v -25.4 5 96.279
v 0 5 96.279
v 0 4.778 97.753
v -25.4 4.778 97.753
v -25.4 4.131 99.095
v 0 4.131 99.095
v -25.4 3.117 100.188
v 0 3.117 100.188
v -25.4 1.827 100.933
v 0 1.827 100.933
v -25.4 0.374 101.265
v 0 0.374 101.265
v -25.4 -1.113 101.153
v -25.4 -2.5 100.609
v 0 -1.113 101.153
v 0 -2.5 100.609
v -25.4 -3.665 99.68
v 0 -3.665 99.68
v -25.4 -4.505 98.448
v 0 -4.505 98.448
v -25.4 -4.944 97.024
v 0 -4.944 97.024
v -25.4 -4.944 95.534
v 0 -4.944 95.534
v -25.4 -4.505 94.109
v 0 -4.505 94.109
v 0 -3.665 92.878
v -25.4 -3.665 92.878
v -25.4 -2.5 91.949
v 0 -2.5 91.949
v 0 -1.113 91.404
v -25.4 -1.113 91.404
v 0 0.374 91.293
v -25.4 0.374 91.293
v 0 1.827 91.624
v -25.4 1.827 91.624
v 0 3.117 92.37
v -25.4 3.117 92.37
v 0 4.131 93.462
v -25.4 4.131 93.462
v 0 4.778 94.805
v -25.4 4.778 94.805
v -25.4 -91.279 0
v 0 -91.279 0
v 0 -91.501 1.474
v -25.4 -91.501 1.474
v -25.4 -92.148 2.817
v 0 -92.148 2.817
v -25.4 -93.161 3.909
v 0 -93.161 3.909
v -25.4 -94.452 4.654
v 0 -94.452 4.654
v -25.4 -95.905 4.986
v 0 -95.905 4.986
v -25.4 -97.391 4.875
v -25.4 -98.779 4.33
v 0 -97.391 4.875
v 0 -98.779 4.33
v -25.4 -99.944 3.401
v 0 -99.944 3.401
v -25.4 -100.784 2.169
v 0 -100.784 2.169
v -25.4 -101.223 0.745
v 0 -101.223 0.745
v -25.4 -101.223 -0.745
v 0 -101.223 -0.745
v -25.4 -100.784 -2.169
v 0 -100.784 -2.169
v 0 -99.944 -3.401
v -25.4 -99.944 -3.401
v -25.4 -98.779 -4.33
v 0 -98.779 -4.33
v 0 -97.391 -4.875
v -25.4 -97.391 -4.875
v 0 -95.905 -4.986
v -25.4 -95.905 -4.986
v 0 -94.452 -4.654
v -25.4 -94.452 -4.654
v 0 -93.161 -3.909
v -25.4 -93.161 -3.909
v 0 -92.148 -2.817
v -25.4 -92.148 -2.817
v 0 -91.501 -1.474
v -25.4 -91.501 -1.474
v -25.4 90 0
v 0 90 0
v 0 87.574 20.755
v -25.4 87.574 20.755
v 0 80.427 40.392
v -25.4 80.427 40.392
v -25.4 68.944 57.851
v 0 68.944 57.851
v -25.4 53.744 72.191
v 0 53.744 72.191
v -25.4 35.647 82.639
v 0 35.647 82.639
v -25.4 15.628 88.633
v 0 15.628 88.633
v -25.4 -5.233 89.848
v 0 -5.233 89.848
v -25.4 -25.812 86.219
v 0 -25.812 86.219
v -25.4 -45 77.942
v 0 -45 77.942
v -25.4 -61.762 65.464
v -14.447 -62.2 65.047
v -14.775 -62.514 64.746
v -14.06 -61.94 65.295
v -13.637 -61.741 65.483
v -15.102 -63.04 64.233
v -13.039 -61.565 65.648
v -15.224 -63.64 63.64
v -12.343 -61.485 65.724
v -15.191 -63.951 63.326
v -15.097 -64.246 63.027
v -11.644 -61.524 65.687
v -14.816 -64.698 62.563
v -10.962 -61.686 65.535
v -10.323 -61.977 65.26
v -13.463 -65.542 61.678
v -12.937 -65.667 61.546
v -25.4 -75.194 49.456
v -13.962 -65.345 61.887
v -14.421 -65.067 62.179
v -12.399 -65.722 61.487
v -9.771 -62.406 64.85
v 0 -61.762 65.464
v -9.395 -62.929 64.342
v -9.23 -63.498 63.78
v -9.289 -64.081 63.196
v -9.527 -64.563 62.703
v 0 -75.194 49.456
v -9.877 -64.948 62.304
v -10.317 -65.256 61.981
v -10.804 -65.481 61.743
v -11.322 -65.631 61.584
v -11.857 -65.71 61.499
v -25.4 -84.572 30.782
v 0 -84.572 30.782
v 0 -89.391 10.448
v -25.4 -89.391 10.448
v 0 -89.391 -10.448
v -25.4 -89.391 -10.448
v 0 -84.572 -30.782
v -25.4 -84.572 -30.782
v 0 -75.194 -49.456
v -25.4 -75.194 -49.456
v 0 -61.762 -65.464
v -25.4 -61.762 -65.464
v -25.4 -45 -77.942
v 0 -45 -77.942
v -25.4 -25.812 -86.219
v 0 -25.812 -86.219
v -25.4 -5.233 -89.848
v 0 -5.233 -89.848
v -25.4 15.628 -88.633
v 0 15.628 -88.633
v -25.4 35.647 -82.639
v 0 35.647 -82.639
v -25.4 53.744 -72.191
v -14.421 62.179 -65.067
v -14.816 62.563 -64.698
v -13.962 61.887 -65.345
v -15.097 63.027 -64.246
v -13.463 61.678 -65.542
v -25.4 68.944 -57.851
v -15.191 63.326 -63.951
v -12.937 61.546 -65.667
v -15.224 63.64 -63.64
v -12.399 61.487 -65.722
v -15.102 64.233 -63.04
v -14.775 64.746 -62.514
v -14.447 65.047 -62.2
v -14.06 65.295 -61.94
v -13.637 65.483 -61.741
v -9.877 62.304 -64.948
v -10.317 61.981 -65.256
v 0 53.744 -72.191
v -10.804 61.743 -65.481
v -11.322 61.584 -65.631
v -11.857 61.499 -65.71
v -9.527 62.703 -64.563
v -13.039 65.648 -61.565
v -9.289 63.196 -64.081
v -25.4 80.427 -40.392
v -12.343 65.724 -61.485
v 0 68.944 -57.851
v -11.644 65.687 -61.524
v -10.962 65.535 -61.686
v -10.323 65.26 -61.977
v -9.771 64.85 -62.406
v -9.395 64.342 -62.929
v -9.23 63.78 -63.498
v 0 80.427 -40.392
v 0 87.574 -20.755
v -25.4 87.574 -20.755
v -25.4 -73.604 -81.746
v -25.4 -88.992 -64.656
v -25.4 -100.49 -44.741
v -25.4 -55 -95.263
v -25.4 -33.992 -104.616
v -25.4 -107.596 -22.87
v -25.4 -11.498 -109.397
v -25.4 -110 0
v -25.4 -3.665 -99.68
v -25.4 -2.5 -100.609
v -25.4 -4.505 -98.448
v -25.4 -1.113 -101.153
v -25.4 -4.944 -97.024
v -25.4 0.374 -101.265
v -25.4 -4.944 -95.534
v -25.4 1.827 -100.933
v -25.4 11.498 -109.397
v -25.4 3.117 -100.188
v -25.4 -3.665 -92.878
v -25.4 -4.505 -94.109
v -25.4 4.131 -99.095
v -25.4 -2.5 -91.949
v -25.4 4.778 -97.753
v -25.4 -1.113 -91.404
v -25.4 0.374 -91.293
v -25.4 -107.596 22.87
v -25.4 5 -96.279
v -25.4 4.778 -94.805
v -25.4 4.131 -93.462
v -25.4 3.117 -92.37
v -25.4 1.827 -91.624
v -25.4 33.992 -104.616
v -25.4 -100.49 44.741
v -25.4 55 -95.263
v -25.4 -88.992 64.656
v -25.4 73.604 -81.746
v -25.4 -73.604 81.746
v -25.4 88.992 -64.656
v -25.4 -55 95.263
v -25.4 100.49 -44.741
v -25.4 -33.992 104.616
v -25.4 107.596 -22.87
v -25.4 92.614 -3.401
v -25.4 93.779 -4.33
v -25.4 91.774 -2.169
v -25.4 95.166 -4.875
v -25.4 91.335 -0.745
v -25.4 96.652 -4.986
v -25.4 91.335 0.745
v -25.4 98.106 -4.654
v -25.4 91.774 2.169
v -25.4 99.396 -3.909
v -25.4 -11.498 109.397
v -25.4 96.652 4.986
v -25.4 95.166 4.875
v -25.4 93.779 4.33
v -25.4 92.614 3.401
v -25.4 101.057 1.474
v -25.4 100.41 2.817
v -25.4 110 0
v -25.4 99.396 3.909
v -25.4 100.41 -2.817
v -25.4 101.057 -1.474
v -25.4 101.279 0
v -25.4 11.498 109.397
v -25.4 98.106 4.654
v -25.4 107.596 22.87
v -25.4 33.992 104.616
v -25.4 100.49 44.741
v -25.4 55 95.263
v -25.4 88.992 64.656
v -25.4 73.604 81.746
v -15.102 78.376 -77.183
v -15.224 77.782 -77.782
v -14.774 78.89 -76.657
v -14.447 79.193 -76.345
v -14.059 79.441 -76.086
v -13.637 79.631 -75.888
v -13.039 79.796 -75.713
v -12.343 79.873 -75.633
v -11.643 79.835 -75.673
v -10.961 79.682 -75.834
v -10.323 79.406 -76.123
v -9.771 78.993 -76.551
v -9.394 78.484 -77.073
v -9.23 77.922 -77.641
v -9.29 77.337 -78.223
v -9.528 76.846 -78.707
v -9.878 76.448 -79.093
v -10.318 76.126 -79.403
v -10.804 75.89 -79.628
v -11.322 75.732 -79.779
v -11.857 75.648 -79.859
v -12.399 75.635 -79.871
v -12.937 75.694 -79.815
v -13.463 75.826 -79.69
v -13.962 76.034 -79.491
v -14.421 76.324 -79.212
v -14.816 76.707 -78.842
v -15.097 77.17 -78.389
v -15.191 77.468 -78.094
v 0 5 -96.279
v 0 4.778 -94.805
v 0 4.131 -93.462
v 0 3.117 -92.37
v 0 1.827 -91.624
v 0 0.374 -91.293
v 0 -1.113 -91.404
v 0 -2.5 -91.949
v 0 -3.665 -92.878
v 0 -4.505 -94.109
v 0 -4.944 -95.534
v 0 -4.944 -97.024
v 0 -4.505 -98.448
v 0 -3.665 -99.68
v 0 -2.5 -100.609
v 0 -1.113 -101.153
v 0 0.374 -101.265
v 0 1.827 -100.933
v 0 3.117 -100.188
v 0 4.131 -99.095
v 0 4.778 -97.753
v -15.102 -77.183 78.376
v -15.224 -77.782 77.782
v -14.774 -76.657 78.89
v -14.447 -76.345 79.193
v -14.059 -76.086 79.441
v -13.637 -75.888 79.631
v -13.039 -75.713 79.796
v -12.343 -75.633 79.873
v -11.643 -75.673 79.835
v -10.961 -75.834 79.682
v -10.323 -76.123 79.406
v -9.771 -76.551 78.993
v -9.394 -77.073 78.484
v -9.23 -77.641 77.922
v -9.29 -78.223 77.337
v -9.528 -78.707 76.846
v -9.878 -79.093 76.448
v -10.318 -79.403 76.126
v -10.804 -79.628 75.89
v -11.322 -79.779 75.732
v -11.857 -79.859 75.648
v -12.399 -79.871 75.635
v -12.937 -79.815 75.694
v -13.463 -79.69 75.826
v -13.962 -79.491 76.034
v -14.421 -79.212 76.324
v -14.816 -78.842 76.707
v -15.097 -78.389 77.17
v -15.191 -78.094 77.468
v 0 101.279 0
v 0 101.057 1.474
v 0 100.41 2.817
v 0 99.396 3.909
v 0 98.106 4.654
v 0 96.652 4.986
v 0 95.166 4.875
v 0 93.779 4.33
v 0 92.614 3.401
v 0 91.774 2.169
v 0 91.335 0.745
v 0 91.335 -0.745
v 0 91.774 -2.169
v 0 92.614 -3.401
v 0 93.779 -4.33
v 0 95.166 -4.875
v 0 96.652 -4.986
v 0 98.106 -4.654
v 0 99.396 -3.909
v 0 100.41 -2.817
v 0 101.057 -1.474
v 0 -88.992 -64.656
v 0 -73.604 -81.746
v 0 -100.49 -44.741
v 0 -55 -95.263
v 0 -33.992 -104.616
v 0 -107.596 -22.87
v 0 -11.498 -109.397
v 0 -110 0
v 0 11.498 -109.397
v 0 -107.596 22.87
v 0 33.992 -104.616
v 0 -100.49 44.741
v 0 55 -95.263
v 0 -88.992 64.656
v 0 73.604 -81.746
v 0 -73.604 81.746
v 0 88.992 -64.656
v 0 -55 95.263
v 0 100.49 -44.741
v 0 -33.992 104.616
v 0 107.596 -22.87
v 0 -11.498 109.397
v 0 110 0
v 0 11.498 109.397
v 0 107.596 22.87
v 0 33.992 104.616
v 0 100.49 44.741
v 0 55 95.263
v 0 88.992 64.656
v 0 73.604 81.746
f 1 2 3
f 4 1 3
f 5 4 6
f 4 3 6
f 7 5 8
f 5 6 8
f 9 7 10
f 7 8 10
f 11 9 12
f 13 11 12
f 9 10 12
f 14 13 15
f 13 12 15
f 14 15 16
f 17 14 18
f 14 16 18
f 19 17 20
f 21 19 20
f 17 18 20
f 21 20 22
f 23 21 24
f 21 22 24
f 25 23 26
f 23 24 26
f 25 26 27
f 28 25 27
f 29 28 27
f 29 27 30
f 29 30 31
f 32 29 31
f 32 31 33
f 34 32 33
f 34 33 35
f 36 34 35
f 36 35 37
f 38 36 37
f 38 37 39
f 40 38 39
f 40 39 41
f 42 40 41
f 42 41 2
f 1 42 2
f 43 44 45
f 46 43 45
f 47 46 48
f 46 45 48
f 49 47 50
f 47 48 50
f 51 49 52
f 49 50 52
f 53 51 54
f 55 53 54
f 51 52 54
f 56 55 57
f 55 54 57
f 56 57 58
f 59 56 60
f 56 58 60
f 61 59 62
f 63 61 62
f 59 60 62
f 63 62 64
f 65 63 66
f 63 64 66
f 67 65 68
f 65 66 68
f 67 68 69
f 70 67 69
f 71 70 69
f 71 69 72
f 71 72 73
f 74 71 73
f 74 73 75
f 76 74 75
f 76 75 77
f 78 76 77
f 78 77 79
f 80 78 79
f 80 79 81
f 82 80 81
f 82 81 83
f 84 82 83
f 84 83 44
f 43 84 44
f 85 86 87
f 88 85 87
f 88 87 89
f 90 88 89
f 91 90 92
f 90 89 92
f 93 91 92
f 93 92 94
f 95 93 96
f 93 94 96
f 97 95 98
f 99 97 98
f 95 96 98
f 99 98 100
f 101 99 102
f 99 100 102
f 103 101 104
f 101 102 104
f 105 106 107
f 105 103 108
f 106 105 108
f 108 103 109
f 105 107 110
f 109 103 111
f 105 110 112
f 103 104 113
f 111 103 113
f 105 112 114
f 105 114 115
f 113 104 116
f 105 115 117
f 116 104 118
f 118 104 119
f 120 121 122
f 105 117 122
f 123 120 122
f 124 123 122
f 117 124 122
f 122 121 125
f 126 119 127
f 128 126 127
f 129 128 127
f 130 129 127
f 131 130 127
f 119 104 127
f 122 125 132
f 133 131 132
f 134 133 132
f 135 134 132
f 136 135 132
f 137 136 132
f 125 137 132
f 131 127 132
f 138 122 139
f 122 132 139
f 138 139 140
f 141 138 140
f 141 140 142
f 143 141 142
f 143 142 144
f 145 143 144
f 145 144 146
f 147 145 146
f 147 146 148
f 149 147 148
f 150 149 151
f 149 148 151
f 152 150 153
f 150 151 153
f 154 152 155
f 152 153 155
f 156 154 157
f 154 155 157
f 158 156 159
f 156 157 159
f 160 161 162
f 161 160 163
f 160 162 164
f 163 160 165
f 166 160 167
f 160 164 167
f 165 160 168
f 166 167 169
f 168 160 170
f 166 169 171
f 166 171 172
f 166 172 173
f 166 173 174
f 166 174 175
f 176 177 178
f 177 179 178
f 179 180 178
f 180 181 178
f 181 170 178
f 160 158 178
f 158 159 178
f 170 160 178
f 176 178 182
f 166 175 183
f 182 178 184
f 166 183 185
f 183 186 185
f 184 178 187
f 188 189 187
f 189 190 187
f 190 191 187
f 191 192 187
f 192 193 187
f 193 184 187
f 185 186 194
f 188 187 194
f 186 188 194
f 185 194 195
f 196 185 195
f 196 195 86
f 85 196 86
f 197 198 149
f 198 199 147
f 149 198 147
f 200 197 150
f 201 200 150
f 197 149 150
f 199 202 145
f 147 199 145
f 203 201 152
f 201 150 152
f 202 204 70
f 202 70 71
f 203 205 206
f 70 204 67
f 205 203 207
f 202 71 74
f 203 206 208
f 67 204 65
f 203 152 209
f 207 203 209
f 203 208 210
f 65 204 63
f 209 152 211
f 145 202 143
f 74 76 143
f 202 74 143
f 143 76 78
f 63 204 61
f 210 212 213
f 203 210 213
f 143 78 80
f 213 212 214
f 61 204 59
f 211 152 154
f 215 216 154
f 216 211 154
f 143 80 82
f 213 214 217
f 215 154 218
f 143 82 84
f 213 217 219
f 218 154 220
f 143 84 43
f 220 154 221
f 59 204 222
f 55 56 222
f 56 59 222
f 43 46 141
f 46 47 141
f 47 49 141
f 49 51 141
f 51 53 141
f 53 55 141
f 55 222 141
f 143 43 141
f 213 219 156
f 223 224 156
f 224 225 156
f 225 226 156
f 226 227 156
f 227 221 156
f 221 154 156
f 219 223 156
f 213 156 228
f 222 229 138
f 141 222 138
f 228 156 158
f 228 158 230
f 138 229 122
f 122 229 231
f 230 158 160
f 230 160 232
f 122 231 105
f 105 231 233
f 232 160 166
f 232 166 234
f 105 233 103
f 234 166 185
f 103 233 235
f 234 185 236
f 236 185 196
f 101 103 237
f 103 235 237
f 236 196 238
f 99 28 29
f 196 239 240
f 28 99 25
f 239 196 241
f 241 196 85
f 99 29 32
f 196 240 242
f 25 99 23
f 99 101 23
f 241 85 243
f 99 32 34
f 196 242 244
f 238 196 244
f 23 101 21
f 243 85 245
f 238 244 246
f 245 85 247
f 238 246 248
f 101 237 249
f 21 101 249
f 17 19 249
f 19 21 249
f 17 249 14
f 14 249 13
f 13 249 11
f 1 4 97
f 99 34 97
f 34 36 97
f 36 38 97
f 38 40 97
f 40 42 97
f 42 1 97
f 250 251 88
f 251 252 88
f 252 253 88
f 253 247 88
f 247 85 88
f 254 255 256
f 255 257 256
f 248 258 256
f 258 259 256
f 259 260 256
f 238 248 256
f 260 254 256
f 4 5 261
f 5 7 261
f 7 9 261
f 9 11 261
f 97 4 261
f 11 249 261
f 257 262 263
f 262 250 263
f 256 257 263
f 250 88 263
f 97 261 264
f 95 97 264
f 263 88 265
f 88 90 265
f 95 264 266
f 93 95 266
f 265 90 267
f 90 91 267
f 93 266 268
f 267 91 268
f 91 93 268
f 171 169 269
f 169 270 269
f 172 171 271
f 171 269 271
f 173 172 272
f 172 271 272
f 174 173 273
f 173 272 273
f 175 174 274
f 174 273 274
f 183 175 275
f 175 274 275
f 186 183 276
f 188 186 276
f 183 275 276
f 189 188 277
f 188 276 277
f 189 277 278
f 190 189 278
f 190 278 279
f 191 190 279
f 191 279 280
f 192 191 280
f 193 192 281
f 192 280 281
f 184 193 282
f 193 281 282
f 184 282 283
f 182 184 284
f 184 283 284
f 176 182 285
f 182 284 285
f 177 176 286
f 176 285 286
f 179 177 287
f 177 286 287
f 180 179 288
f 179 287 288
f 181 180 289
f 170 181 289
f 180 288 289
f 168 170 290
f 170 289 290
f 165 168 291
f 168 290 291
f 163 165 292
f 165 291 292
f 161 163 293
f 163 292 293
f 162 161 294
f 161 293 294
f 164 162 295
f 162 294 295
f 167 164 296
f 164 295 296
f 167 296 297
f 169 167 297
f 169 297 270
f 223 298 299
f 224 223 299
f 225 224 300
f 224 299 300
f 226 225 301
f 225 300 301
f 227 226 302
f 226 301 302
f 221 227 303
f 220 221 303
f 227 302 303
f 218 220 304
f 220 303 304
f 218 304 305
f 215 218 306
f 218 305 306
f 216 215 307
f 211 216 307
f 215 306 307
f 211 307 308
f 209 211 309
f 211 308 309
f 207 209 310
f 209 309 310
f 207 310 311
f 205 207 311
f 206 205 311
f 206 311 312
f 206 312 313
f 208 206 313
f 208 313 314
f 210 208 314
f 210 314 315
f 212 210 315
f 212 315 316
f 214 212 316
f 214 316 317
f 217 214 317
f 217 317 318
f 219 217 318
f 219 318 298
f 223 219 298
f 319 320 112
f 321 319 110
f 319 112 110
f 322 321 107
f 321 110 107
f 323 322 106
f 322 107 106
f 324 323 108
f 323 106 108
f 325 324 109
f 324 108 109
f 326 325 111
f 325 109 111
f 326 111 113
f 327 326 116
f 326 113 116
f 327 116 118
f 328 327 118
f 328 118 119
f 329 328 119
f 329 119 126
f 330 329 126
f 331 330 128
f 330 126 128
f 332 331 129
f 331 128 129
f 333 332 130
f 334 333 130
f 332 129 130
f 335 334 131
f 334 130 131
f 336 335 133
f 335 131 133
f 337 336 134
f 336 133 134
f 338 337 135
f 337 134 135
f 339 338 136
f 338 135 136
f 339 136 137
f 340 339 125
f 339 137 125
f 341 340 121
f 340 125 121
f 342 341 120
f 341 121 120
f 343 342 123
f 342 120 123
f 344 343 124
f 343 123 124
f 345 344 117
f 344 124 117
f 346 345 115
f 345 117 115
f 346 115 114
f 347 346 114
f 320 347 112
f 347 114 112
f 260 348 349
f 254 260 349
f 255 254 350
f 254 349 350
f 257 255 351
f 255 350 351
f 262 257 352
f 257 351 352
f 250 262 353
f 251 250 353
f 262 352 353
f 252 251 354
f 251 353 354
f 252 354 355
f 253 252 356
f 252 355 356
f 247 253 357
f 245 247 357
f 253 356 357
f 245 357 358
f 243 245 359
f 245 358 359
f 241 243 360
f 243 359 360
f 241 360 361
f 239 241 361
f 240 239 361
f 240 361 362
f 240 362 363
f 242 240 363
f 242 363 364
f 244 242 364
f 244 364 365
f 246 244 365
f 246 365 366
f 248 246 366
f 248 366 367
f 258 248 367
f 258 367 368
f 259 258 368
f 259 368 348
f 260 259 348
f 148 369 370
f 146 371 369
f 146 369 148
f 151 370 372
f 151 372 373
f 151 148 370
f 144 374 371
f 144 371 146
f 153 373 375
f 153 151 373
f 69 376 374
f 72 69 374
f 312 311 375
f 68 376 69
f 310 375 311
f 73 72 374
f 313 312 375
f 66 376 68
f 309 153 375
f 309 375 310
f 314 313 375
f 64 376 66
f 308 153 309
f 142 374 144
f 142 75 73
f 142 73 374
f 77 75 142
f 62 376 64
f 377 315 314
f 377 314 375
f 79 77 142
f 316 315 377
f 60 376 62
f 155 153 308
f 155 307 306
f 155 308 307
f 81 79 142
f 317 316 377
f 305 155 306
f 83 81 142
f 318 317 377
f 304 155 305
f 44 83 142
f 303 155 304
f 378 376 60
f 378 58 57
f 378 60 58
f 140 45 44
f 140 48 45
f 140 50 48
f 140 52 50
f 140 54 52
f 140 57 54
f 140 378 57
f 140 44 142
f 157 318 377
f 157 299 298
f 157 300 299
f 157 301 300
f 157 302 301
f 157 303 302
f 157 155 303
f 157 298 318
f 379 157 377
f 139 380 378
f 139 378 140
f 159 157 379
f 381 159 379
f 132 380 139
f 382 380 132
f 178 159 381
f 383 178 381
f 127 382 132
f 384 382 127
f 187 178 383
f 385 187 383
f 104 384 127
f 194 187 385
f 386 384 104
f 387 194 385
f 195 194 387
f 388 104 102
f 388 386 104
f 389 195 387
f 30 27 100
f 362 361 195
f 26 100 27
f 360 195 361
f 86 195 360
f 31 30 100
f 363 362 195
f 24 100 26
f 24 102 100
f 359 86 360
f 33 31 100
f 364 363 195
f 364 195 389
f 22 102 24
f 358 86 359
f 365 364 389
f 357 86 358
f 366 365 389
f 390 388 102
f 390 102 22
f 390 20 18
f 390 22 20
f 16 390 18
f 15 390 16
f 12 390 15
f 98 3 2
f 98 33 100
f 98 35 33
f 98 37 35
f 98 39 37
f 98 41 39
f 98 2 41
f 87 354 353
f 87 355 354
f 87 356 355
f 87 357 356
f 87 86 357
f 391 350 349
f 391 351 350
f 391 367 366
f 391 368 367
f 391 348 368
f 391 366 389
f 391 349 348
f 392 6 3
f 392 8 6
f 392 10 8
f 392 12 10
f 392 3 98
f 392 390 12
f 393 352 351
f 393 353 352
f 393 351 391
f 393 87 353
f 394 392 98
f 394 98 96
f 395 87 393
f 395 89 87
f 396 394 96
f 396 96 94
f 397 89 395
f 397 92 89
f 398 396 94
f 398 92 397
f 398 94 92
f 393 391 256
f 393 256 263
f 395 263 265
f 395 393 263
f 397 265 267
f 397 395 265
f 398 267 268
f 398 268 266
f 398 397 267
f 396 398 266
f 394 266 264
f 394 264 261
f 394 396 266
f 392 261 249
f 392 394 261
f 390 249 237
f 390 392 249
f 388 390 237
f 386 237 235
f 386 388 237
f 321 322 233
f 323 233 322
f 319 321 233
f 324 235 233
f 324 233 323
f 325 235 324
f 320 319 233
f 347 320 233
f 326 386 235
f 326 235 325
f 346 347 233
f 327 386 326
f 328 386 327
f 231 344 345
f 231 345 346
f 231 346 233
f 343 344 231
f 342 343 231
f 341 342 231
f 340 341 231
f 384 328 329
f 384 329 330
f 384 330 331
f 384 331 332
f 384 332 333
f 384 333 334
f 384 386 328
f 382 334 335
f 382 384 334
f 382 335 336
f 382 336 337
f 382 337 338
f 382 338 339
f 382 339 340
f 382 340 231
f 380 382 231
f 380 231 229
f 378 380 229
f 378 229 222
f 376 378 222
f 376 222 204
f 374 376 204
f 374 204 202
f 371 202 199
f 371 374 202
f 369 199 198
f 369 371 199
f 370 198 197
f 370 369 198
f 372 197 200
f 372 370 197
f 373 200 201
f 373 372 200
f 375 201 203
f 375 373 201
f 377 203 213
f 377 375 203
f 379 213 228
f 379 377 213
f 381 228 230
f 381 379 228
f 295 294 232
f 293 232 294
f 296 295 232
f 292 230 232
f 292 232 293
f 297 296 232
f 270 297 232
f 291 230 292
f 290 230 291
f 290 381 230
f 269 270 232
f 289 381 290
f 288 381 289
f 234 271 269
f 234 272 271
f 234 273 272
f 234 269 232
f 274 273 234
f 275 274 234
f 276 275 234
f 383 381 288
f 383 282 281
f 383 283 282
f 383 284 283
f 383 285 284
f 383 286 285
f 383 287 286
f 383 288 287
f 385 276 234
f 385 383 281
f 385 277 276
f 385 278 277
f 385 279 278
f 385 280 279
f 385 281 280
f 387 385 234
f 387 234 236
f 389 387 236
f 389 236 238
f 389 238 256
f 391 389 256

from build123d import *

# Parameters (mm, degrees)
F0_R     = 110
F0_R_2   = 90
F1_DEPTH = 25.4
F4_R     = 3
F5_DEPTH = 110.5
F7_R     = 5
F8_DEPTH = 25.5


with BuildPart() as f1:
    # F0 (on Right) → F1 (new body)
    with BuildSketch(Plane.YZ):
        Circle(F0_R)
        Circle(F0_R_2, mode=Mode.SUBTRACT)
    extrude(amount=-F1_DEPTH)

    # F4 (on face) → F5 (cut, symmetric)
    with BuildSketch(Plane(origin=(0, 0, 0), x_dir=(-1, 0, 0), z_dir=(0, 0.707107, -0.707107))):
        with Locations((12.223506, 0)):
            Circle(F4_R)
    extrude(amount=F5_DEPTH, both=True, mode=Mode.SUBTRACT)

    # F7 (on face) → F8 (cut)
    with BuildSketch(Plane.YZ):
        with Locations((0, 96.278802)):
            Circle(F7_R)
        with Locations((-96.278802, 0)):
            Circle(F7_R)
        with Locations((0, -96.278802)):
            Circle(F7_R)
        with Locations((96.278802, 0)):
            Circle(F7_R)
    extrude(amount=-F8_DEPTH, mode=Mode.SUBTRACT)


solid = f1.part
